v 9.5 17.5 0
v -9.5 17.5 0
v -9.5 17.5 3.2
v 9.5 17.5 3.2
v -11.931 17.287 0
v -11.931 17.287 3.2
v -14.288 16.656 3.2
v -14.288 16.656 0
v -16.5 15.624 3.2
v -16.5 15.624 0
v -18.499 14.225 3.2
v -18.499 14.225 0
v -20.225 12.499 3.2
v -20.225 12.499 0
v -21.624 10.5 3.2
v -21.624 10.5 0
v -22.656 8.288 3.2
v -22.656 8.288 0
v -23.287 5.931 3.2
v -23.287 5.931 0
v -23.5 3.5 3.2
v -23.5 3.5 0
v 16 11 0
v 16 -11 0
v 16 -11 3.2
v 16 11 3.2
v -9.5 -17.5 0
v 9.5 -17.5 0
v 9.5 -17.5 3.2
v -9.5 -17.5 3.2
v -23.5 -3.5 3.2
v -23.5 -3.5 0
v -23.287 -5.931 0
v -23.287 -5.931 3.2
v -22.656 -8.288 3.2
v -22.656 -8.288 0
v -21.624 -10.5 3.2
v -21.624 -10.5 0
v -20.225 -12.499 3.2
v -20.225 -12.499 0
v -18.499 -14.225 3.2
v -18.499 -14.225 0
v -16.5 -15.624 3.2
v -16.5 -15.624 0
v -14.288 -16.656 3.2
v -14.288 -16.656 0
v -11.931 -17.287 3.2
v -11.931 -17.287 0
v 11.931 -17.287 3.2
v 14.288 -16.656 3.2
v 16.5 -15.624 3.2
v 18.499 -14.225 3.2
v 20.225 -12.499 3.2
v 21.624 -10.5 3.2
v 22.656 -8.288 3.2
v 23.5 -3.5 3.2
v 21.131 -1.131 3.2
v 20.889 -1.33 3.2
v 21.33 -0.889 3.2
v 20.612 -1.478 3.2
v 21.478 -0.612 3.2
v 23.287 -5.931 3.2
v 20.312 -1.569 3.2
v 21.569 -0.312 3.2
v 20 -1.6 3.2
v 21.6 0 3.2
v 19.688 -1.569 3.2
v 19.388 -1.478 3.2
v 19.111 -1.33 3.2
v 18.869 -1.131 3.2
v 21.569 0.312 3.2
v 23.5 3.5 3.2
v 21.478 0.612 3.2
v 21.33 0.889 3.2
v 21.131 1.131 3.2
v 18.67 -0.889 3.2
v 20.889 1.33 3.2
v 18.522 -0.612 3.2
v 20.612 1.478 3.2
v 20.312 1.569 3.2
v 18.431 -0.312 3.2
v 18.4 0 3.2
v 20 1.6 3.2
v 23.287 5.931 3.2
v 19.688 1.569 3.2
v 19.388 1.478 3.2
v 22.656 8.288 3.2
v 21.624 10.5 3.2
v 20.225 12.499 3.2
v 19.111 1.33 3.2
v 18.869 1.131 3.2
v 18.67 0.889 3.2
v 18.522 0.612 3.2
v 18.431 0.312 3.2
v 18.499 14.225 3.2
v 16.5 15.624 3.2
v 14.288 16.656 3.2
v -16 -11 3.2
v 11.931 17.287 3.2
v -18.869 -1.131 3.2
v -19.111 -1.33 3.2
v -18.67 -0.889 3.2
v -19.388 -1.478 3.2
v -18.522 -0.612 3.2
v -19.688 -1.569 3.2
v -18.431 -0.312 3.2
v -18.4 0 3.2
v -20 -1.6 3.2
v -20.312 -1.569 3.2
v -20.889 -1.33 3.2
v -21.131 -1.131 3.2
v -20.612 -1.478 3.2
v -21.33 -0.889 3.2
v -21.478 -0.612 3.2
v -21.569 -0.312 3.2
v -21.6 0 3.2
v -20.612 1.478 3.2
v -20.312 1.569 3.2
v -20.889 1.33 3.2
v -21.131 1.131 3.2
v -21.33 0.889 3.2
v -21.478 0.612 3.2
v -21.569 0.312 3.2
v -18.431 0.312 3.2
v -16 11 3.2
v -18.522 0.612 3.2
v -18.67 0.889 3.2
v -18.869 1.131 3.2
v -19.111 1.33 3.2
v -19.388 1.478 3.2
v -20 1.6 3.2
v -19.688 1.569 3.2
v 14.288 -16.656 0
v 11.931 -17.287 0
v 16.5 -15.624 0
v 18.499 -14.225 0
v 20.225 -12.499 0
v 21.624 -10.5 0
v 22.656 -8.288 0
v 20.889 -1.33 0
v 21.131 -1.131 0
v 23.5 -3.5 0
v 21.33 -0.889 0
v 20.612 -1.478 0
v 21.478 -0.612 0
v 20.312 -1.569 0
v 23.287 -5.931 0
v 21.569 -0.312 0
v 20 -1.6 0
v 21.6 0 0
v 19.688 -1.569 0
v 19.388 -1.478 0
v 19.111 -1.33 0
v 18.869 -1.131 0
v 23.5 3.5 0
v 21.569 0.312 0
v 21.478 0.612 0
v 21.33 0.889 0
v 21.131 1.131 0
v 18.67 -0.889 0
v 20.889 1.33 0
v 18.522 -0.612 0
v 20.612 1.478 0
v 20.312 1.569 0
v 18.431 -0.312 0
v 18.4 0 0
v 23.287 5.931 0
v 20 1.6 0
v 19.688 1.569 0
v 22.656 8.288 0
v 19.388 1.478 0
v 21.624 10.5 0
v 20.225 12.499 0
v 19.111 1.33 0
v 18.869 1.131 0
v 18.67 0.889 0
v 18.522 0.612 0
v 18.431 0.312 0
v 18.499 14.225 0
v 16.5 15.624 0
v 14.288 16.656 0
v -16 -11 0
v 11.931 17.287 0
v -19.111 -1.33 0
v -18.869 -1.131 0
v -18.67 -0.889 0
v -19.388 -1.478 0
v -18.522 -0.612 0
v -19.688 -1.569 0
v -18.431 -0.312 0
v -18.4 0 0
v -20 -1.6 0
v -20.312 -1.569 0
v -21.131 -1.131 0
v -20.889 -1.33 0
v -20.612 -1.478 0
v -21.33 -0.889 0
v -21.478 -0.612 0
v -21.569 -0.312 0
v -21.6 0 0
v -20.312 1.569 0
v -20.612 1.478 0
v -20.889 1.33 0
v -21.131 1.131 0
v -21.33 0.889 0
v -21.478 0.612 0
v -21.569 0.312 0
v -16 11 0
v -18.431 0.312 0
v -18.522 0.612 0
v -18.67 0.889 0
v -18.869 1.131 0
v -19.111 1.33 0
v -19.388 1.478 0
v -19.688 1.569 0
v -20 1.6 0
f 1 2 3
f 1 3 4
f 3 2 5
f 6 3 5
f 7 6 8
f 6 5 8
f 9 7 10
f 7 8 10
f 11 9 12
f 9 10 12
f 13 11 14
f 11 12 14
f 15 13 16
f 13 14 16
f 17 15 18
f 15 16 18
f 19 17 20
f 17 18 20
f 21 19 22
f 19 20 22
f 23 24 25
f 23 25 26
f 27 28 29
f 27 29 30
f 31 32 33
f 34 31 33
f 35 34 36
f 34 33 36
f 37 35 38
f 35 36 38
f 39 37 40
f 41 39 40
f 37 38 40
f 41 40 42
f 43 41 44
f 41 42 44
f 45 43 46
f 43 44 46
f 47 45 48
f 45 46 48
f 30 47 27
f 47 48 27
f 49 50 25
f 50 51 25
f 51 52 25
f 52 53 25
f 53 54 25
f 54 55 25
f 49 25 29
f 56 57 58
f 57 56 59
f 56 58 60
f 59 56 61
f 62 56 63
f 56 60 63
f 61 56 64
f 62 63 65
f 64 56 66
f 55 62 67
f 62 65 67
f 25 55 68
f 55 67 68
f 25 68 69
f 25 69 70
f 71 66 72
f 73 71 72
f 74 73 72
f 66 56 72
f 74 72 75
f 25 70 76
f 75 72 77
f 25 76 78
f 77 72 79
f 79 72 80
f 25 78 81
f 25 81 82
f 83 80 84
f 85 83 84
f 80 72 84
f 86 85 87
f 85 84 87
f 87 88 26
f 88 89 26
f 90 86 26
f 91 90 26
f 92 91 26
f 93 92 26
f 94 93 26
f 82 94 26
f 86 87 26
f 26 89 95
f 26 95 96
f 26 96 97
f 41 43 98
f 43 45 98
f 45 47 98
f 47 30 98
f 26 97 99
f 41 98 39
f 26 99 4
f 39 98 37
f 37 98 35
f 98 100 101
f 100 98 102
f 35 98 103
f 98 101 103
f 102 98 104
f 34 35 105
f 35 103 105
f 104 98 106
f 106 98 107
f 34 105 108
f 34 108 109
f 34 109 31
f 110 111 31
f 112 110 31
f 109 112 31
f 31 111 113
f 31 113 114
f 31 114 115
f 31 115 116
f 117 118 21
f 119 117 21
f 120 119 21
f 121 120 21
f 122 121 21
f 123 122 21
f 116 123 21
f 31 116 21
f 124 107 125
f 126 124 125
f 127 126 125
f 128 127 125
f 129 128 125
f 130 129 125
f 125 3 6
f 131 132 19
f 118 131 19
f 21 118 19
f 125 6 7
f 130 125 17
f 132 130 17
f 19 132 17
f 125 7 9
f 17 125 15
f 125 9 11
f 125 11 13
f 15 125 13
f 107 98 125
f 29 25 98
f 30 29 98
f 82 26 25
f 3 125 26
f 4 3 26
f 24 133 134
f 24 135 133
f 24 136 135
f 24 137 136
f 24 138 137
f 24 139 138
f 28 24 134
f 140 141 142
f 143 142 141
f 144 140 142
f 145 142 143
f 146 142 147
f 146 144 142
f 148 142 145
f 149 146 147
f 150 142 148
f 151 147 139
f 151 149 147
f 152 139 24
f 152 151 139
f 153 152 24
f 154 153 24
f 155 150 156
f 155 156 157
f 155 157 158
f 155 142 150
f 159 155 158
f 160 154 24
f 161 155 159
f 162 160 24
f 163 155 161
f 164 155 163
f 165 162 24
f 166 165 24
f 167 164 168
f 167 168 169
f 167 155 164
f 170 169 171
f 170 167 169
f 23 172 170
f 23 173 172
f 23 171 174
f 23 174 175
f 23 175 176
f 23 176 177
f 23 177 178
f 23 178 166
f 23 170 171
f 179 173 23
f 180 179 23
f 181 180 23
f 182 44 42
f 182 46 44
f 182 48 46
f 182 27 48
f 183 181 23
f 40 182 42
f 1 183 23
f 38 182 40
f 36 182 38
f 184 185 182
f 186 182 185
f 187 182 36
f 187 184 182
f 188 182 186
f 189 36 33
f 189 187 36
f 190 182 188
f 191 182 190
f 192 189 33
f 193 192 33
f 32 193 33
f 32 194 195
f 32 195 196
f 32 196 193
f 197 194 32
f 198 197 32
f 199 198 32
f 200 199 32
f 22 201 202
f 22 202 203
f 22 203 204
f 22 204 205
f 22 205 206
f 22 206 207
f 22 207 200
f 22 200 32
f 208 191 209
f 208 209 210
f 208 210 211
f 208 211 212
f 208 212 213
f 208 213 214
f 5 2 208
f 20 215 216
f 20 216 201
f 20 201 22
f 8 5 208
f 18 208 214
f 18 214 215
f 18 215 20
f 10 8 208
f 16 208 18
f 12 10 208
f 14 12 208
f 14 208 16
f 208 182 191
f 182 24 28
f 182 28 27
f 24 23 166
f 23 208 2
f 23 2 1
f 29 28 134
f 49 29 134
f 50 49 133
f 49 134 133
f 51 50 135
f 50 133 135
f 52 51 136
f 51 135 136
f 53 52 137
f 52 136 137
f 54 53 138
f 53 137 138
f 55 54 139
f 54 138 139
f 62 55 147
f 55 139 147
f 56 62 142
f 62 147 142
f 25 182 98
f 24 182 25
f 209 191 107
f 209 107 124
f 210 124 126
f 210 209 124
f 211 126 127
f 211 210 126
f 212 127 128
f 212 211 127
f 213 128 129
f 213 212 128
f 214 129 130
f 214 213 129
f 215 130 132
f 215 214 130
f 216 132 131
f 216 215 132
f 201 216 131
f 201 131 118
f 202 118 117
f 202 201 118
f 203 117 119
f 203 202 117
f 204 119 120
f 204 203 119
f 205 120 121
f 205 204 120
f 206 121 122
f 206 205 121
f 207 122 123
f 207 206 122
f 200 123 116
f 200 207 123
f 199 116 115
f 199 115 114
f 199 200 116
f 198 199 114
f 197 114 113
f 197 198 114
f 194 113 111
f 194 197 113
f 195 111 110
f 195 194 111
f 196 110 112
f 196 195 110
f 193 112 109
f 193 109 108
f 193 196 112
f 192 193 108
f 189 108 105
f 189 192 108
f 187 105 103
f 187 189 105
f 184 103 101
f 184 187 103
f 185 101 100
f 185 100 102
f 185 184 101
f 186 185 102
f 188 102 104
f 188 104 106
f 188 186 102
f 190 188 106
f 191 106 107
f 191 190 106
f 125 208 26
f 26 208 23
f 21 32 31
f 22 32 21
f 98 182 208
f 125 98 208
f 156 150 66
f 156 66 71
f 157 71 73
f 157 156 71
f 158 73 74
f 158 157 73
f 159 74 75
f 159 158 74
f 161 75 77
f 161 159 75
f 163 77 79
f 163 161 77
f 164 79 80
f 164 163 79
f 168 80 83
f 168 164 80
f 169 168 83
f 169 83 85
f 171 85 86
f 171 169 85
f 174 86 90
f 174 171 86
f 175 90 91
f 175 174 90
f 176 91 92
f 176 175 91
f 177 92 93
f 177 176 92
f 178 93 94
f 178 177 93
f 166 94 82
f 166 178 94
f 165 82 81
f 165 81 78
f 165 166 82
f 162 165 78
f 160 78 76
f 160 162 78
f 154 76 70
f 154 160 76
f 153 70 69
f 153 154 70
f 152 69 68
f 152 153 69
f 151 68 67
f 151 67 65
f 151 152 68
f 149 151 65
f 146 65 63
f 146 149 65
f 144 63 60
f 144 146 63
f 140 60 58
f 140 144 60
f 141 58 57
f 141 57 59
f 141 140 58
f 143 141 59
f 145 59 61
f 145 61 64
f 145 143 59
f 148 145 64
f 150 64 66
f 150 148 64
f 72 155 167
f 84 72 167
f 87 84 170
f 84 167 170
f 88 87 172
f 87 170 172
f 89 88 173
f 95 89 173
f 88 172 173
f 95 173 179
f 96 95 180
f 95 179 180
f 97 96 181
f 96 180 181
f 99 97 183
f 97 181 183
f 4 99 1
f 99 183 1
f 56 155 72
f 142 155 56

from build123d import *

# Parameters (mm, degrees)
SKETCH_R  = 1.6
SKETCH_W  = 32
SKETCH_H  = 22
PAD_DEPTH = 3.2


with BuildPart() as part:
    # Sketch → Pad (new body)
    with BuildSketch(Plane.XY):
        with BuildLine():
            Line((-9.5, 17.5), (9.5, 17.5))
            ThreePointArc((23.5, 3.5), (19.399495, 13.399495), (9.5, 17.5))
            Line((23.5, 3.5), (23.5, -3.5))
            ThreePointArc((9.5, -17.5), (19.399495, -13.399495), (23.5, -3.5))
            Line((9.5, -17.5), (-9.5, -17.5))
            ThreePointArc((-23.5, -3.5), (-19.399495, -13.399495), (-9.5, -17.5))
            Line((-23.5, -3.5), (-23.5, 3.5))
            ThreePointArc((-9.5, 17.5), (-19.399495, 13.399495), (-23.5, 3.5))
        make_face()
        with Locations((-20, 0)):
            Circle(SKETCH_R, mode=Mode.SUBTRACT)
        with Locations((20, 0)):
            Circle(SKETCH_R, mode=Mode.SUBTRACT)
        Rectangle(SKETCH_W, SKETCH_H, mode=Mode.SUBTRACT)
    extrude(amount=PAD_DEPTH)


solid = part.part
